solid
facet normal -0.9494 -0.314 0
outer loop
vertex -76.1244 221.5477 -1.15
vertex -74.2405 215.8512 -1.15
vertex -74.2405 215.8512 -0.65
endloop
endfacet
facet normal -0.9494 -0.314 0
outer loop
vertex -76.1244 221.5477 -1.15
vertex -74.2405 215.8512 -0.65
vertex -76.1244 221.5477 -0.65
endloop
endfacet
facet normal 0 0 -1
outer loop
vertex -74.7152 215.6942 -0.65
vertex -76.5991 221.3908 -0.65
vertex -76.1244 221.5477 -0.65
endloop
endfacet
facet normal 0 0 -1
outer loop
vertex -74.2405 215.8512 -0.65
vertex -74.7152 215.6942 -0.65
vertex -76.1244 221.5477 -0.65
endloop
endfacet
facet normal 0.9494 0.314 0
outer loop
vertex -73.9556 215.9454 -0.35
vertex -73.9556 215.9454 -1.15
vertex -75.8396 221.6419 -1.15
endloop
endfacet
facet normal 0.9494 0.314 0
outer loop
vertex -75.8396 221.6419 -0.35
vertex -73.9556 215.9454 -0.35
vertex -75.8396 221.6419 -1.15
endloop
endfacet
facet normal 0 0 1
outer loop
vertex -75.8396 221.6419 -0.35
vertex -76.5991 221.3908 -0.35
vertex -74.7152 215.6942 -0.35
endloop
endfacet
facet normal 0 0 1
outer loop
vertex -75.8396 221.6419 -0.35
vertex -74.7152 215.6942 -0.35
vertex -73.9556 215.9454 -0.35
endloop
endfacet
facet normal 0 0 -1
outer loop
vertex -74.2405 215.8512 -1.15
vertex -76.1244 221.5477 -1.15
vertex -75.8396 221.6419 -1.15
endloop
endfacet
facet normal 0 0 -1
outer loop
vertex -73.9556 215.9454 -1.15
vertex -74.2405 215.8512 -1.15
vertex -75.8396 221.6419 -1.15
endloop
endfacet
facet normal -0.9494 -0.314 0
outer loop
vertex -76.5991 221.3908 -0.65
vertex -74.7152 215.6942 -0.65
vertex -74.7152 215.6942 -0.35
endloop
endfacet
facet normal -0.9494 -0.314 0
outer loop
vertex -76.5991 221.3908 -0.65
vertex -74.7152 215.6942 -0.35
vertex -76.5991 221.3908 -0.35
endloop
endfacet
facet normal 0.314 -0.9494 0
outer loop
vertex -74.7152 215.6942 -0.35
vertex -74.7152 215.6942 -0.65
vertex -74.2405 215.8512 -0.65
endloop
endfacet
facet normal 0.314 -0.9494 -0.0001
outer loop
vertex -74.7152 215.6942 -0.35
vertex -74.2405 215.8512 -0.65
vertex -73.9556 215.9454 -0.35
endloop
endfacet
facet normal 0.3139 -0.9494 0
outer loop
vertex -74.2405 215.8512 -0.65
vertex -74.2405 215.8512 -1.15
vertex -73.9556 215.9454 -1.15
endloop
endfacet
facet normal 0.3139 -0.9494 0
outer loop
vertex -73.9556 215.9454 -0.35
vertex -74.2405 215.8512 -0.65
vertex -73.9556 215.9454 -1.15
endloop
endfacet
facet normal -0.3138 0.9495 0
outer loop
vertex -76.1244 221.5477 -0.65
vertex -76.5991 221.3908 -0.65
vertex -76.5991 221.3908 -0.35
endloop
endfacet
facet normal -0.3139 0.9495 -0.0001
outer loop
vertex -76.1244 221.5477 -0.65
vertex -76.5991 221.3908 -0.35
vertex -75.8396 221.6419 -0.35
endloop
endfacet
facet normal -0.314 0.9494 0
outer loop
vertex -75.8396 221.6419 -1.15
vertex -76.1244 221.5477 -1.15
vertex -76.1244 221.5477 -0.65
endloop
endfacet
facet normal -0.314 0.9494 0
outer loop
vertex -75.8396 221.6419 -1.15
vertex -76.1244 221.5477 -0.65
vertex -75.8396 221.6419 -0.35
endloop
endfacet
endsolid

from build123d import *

# Parameters (mm, degrees)
BOX151_W               = 0.8
BOX151_H               = 6
BOX151_DEPTH           = 0.8
BOX152_W               = 0.8
BOX152_H               = 6
BOX152_DEPTH           = 0.8
CUT079_PLACEMENT_ANGLE = 18.3


with BuildPart() as cubo151:
    # Box151 → Box151 (new body)
    with BuildSketch(Plane.XY):
        with Locations((0.4, 3)):
            Rectangle(BOX151_W, BOX151_H)
    extrude(amount=BOX151_DEPTH)


with BuildPart() as perfil_l_2da_cara021:
    # Box152 → Box152 (new body)
    with BuildSketch(Plane(origin=(0.3, 0, 0.3), x_dir=(1, 0, 0), z_dir=(0, 0, 1))):
        with Locations((0.4, 3)):
            Rectangle(BOX152_W, BOX152_H)
    extrude(amount=BOX152_DEPTH)

    # Cut079: cut Cubo151
    add(cubo151.part, mode=Mode.SUBTRACT)


with BuildPart() as perfil_l_2da_cara021_1:
    # Cut079 placement: moved
    add(perfil_l_2da_cara021.part.moved(Location((-75, 215.6, -1.45))).rotate(Axis((-75, 215.6, -1.45), (0, 0, 1)), CUT079_PLACEMENT_ANGLE))


solid = perfil_l_2da_cara021_1.part
